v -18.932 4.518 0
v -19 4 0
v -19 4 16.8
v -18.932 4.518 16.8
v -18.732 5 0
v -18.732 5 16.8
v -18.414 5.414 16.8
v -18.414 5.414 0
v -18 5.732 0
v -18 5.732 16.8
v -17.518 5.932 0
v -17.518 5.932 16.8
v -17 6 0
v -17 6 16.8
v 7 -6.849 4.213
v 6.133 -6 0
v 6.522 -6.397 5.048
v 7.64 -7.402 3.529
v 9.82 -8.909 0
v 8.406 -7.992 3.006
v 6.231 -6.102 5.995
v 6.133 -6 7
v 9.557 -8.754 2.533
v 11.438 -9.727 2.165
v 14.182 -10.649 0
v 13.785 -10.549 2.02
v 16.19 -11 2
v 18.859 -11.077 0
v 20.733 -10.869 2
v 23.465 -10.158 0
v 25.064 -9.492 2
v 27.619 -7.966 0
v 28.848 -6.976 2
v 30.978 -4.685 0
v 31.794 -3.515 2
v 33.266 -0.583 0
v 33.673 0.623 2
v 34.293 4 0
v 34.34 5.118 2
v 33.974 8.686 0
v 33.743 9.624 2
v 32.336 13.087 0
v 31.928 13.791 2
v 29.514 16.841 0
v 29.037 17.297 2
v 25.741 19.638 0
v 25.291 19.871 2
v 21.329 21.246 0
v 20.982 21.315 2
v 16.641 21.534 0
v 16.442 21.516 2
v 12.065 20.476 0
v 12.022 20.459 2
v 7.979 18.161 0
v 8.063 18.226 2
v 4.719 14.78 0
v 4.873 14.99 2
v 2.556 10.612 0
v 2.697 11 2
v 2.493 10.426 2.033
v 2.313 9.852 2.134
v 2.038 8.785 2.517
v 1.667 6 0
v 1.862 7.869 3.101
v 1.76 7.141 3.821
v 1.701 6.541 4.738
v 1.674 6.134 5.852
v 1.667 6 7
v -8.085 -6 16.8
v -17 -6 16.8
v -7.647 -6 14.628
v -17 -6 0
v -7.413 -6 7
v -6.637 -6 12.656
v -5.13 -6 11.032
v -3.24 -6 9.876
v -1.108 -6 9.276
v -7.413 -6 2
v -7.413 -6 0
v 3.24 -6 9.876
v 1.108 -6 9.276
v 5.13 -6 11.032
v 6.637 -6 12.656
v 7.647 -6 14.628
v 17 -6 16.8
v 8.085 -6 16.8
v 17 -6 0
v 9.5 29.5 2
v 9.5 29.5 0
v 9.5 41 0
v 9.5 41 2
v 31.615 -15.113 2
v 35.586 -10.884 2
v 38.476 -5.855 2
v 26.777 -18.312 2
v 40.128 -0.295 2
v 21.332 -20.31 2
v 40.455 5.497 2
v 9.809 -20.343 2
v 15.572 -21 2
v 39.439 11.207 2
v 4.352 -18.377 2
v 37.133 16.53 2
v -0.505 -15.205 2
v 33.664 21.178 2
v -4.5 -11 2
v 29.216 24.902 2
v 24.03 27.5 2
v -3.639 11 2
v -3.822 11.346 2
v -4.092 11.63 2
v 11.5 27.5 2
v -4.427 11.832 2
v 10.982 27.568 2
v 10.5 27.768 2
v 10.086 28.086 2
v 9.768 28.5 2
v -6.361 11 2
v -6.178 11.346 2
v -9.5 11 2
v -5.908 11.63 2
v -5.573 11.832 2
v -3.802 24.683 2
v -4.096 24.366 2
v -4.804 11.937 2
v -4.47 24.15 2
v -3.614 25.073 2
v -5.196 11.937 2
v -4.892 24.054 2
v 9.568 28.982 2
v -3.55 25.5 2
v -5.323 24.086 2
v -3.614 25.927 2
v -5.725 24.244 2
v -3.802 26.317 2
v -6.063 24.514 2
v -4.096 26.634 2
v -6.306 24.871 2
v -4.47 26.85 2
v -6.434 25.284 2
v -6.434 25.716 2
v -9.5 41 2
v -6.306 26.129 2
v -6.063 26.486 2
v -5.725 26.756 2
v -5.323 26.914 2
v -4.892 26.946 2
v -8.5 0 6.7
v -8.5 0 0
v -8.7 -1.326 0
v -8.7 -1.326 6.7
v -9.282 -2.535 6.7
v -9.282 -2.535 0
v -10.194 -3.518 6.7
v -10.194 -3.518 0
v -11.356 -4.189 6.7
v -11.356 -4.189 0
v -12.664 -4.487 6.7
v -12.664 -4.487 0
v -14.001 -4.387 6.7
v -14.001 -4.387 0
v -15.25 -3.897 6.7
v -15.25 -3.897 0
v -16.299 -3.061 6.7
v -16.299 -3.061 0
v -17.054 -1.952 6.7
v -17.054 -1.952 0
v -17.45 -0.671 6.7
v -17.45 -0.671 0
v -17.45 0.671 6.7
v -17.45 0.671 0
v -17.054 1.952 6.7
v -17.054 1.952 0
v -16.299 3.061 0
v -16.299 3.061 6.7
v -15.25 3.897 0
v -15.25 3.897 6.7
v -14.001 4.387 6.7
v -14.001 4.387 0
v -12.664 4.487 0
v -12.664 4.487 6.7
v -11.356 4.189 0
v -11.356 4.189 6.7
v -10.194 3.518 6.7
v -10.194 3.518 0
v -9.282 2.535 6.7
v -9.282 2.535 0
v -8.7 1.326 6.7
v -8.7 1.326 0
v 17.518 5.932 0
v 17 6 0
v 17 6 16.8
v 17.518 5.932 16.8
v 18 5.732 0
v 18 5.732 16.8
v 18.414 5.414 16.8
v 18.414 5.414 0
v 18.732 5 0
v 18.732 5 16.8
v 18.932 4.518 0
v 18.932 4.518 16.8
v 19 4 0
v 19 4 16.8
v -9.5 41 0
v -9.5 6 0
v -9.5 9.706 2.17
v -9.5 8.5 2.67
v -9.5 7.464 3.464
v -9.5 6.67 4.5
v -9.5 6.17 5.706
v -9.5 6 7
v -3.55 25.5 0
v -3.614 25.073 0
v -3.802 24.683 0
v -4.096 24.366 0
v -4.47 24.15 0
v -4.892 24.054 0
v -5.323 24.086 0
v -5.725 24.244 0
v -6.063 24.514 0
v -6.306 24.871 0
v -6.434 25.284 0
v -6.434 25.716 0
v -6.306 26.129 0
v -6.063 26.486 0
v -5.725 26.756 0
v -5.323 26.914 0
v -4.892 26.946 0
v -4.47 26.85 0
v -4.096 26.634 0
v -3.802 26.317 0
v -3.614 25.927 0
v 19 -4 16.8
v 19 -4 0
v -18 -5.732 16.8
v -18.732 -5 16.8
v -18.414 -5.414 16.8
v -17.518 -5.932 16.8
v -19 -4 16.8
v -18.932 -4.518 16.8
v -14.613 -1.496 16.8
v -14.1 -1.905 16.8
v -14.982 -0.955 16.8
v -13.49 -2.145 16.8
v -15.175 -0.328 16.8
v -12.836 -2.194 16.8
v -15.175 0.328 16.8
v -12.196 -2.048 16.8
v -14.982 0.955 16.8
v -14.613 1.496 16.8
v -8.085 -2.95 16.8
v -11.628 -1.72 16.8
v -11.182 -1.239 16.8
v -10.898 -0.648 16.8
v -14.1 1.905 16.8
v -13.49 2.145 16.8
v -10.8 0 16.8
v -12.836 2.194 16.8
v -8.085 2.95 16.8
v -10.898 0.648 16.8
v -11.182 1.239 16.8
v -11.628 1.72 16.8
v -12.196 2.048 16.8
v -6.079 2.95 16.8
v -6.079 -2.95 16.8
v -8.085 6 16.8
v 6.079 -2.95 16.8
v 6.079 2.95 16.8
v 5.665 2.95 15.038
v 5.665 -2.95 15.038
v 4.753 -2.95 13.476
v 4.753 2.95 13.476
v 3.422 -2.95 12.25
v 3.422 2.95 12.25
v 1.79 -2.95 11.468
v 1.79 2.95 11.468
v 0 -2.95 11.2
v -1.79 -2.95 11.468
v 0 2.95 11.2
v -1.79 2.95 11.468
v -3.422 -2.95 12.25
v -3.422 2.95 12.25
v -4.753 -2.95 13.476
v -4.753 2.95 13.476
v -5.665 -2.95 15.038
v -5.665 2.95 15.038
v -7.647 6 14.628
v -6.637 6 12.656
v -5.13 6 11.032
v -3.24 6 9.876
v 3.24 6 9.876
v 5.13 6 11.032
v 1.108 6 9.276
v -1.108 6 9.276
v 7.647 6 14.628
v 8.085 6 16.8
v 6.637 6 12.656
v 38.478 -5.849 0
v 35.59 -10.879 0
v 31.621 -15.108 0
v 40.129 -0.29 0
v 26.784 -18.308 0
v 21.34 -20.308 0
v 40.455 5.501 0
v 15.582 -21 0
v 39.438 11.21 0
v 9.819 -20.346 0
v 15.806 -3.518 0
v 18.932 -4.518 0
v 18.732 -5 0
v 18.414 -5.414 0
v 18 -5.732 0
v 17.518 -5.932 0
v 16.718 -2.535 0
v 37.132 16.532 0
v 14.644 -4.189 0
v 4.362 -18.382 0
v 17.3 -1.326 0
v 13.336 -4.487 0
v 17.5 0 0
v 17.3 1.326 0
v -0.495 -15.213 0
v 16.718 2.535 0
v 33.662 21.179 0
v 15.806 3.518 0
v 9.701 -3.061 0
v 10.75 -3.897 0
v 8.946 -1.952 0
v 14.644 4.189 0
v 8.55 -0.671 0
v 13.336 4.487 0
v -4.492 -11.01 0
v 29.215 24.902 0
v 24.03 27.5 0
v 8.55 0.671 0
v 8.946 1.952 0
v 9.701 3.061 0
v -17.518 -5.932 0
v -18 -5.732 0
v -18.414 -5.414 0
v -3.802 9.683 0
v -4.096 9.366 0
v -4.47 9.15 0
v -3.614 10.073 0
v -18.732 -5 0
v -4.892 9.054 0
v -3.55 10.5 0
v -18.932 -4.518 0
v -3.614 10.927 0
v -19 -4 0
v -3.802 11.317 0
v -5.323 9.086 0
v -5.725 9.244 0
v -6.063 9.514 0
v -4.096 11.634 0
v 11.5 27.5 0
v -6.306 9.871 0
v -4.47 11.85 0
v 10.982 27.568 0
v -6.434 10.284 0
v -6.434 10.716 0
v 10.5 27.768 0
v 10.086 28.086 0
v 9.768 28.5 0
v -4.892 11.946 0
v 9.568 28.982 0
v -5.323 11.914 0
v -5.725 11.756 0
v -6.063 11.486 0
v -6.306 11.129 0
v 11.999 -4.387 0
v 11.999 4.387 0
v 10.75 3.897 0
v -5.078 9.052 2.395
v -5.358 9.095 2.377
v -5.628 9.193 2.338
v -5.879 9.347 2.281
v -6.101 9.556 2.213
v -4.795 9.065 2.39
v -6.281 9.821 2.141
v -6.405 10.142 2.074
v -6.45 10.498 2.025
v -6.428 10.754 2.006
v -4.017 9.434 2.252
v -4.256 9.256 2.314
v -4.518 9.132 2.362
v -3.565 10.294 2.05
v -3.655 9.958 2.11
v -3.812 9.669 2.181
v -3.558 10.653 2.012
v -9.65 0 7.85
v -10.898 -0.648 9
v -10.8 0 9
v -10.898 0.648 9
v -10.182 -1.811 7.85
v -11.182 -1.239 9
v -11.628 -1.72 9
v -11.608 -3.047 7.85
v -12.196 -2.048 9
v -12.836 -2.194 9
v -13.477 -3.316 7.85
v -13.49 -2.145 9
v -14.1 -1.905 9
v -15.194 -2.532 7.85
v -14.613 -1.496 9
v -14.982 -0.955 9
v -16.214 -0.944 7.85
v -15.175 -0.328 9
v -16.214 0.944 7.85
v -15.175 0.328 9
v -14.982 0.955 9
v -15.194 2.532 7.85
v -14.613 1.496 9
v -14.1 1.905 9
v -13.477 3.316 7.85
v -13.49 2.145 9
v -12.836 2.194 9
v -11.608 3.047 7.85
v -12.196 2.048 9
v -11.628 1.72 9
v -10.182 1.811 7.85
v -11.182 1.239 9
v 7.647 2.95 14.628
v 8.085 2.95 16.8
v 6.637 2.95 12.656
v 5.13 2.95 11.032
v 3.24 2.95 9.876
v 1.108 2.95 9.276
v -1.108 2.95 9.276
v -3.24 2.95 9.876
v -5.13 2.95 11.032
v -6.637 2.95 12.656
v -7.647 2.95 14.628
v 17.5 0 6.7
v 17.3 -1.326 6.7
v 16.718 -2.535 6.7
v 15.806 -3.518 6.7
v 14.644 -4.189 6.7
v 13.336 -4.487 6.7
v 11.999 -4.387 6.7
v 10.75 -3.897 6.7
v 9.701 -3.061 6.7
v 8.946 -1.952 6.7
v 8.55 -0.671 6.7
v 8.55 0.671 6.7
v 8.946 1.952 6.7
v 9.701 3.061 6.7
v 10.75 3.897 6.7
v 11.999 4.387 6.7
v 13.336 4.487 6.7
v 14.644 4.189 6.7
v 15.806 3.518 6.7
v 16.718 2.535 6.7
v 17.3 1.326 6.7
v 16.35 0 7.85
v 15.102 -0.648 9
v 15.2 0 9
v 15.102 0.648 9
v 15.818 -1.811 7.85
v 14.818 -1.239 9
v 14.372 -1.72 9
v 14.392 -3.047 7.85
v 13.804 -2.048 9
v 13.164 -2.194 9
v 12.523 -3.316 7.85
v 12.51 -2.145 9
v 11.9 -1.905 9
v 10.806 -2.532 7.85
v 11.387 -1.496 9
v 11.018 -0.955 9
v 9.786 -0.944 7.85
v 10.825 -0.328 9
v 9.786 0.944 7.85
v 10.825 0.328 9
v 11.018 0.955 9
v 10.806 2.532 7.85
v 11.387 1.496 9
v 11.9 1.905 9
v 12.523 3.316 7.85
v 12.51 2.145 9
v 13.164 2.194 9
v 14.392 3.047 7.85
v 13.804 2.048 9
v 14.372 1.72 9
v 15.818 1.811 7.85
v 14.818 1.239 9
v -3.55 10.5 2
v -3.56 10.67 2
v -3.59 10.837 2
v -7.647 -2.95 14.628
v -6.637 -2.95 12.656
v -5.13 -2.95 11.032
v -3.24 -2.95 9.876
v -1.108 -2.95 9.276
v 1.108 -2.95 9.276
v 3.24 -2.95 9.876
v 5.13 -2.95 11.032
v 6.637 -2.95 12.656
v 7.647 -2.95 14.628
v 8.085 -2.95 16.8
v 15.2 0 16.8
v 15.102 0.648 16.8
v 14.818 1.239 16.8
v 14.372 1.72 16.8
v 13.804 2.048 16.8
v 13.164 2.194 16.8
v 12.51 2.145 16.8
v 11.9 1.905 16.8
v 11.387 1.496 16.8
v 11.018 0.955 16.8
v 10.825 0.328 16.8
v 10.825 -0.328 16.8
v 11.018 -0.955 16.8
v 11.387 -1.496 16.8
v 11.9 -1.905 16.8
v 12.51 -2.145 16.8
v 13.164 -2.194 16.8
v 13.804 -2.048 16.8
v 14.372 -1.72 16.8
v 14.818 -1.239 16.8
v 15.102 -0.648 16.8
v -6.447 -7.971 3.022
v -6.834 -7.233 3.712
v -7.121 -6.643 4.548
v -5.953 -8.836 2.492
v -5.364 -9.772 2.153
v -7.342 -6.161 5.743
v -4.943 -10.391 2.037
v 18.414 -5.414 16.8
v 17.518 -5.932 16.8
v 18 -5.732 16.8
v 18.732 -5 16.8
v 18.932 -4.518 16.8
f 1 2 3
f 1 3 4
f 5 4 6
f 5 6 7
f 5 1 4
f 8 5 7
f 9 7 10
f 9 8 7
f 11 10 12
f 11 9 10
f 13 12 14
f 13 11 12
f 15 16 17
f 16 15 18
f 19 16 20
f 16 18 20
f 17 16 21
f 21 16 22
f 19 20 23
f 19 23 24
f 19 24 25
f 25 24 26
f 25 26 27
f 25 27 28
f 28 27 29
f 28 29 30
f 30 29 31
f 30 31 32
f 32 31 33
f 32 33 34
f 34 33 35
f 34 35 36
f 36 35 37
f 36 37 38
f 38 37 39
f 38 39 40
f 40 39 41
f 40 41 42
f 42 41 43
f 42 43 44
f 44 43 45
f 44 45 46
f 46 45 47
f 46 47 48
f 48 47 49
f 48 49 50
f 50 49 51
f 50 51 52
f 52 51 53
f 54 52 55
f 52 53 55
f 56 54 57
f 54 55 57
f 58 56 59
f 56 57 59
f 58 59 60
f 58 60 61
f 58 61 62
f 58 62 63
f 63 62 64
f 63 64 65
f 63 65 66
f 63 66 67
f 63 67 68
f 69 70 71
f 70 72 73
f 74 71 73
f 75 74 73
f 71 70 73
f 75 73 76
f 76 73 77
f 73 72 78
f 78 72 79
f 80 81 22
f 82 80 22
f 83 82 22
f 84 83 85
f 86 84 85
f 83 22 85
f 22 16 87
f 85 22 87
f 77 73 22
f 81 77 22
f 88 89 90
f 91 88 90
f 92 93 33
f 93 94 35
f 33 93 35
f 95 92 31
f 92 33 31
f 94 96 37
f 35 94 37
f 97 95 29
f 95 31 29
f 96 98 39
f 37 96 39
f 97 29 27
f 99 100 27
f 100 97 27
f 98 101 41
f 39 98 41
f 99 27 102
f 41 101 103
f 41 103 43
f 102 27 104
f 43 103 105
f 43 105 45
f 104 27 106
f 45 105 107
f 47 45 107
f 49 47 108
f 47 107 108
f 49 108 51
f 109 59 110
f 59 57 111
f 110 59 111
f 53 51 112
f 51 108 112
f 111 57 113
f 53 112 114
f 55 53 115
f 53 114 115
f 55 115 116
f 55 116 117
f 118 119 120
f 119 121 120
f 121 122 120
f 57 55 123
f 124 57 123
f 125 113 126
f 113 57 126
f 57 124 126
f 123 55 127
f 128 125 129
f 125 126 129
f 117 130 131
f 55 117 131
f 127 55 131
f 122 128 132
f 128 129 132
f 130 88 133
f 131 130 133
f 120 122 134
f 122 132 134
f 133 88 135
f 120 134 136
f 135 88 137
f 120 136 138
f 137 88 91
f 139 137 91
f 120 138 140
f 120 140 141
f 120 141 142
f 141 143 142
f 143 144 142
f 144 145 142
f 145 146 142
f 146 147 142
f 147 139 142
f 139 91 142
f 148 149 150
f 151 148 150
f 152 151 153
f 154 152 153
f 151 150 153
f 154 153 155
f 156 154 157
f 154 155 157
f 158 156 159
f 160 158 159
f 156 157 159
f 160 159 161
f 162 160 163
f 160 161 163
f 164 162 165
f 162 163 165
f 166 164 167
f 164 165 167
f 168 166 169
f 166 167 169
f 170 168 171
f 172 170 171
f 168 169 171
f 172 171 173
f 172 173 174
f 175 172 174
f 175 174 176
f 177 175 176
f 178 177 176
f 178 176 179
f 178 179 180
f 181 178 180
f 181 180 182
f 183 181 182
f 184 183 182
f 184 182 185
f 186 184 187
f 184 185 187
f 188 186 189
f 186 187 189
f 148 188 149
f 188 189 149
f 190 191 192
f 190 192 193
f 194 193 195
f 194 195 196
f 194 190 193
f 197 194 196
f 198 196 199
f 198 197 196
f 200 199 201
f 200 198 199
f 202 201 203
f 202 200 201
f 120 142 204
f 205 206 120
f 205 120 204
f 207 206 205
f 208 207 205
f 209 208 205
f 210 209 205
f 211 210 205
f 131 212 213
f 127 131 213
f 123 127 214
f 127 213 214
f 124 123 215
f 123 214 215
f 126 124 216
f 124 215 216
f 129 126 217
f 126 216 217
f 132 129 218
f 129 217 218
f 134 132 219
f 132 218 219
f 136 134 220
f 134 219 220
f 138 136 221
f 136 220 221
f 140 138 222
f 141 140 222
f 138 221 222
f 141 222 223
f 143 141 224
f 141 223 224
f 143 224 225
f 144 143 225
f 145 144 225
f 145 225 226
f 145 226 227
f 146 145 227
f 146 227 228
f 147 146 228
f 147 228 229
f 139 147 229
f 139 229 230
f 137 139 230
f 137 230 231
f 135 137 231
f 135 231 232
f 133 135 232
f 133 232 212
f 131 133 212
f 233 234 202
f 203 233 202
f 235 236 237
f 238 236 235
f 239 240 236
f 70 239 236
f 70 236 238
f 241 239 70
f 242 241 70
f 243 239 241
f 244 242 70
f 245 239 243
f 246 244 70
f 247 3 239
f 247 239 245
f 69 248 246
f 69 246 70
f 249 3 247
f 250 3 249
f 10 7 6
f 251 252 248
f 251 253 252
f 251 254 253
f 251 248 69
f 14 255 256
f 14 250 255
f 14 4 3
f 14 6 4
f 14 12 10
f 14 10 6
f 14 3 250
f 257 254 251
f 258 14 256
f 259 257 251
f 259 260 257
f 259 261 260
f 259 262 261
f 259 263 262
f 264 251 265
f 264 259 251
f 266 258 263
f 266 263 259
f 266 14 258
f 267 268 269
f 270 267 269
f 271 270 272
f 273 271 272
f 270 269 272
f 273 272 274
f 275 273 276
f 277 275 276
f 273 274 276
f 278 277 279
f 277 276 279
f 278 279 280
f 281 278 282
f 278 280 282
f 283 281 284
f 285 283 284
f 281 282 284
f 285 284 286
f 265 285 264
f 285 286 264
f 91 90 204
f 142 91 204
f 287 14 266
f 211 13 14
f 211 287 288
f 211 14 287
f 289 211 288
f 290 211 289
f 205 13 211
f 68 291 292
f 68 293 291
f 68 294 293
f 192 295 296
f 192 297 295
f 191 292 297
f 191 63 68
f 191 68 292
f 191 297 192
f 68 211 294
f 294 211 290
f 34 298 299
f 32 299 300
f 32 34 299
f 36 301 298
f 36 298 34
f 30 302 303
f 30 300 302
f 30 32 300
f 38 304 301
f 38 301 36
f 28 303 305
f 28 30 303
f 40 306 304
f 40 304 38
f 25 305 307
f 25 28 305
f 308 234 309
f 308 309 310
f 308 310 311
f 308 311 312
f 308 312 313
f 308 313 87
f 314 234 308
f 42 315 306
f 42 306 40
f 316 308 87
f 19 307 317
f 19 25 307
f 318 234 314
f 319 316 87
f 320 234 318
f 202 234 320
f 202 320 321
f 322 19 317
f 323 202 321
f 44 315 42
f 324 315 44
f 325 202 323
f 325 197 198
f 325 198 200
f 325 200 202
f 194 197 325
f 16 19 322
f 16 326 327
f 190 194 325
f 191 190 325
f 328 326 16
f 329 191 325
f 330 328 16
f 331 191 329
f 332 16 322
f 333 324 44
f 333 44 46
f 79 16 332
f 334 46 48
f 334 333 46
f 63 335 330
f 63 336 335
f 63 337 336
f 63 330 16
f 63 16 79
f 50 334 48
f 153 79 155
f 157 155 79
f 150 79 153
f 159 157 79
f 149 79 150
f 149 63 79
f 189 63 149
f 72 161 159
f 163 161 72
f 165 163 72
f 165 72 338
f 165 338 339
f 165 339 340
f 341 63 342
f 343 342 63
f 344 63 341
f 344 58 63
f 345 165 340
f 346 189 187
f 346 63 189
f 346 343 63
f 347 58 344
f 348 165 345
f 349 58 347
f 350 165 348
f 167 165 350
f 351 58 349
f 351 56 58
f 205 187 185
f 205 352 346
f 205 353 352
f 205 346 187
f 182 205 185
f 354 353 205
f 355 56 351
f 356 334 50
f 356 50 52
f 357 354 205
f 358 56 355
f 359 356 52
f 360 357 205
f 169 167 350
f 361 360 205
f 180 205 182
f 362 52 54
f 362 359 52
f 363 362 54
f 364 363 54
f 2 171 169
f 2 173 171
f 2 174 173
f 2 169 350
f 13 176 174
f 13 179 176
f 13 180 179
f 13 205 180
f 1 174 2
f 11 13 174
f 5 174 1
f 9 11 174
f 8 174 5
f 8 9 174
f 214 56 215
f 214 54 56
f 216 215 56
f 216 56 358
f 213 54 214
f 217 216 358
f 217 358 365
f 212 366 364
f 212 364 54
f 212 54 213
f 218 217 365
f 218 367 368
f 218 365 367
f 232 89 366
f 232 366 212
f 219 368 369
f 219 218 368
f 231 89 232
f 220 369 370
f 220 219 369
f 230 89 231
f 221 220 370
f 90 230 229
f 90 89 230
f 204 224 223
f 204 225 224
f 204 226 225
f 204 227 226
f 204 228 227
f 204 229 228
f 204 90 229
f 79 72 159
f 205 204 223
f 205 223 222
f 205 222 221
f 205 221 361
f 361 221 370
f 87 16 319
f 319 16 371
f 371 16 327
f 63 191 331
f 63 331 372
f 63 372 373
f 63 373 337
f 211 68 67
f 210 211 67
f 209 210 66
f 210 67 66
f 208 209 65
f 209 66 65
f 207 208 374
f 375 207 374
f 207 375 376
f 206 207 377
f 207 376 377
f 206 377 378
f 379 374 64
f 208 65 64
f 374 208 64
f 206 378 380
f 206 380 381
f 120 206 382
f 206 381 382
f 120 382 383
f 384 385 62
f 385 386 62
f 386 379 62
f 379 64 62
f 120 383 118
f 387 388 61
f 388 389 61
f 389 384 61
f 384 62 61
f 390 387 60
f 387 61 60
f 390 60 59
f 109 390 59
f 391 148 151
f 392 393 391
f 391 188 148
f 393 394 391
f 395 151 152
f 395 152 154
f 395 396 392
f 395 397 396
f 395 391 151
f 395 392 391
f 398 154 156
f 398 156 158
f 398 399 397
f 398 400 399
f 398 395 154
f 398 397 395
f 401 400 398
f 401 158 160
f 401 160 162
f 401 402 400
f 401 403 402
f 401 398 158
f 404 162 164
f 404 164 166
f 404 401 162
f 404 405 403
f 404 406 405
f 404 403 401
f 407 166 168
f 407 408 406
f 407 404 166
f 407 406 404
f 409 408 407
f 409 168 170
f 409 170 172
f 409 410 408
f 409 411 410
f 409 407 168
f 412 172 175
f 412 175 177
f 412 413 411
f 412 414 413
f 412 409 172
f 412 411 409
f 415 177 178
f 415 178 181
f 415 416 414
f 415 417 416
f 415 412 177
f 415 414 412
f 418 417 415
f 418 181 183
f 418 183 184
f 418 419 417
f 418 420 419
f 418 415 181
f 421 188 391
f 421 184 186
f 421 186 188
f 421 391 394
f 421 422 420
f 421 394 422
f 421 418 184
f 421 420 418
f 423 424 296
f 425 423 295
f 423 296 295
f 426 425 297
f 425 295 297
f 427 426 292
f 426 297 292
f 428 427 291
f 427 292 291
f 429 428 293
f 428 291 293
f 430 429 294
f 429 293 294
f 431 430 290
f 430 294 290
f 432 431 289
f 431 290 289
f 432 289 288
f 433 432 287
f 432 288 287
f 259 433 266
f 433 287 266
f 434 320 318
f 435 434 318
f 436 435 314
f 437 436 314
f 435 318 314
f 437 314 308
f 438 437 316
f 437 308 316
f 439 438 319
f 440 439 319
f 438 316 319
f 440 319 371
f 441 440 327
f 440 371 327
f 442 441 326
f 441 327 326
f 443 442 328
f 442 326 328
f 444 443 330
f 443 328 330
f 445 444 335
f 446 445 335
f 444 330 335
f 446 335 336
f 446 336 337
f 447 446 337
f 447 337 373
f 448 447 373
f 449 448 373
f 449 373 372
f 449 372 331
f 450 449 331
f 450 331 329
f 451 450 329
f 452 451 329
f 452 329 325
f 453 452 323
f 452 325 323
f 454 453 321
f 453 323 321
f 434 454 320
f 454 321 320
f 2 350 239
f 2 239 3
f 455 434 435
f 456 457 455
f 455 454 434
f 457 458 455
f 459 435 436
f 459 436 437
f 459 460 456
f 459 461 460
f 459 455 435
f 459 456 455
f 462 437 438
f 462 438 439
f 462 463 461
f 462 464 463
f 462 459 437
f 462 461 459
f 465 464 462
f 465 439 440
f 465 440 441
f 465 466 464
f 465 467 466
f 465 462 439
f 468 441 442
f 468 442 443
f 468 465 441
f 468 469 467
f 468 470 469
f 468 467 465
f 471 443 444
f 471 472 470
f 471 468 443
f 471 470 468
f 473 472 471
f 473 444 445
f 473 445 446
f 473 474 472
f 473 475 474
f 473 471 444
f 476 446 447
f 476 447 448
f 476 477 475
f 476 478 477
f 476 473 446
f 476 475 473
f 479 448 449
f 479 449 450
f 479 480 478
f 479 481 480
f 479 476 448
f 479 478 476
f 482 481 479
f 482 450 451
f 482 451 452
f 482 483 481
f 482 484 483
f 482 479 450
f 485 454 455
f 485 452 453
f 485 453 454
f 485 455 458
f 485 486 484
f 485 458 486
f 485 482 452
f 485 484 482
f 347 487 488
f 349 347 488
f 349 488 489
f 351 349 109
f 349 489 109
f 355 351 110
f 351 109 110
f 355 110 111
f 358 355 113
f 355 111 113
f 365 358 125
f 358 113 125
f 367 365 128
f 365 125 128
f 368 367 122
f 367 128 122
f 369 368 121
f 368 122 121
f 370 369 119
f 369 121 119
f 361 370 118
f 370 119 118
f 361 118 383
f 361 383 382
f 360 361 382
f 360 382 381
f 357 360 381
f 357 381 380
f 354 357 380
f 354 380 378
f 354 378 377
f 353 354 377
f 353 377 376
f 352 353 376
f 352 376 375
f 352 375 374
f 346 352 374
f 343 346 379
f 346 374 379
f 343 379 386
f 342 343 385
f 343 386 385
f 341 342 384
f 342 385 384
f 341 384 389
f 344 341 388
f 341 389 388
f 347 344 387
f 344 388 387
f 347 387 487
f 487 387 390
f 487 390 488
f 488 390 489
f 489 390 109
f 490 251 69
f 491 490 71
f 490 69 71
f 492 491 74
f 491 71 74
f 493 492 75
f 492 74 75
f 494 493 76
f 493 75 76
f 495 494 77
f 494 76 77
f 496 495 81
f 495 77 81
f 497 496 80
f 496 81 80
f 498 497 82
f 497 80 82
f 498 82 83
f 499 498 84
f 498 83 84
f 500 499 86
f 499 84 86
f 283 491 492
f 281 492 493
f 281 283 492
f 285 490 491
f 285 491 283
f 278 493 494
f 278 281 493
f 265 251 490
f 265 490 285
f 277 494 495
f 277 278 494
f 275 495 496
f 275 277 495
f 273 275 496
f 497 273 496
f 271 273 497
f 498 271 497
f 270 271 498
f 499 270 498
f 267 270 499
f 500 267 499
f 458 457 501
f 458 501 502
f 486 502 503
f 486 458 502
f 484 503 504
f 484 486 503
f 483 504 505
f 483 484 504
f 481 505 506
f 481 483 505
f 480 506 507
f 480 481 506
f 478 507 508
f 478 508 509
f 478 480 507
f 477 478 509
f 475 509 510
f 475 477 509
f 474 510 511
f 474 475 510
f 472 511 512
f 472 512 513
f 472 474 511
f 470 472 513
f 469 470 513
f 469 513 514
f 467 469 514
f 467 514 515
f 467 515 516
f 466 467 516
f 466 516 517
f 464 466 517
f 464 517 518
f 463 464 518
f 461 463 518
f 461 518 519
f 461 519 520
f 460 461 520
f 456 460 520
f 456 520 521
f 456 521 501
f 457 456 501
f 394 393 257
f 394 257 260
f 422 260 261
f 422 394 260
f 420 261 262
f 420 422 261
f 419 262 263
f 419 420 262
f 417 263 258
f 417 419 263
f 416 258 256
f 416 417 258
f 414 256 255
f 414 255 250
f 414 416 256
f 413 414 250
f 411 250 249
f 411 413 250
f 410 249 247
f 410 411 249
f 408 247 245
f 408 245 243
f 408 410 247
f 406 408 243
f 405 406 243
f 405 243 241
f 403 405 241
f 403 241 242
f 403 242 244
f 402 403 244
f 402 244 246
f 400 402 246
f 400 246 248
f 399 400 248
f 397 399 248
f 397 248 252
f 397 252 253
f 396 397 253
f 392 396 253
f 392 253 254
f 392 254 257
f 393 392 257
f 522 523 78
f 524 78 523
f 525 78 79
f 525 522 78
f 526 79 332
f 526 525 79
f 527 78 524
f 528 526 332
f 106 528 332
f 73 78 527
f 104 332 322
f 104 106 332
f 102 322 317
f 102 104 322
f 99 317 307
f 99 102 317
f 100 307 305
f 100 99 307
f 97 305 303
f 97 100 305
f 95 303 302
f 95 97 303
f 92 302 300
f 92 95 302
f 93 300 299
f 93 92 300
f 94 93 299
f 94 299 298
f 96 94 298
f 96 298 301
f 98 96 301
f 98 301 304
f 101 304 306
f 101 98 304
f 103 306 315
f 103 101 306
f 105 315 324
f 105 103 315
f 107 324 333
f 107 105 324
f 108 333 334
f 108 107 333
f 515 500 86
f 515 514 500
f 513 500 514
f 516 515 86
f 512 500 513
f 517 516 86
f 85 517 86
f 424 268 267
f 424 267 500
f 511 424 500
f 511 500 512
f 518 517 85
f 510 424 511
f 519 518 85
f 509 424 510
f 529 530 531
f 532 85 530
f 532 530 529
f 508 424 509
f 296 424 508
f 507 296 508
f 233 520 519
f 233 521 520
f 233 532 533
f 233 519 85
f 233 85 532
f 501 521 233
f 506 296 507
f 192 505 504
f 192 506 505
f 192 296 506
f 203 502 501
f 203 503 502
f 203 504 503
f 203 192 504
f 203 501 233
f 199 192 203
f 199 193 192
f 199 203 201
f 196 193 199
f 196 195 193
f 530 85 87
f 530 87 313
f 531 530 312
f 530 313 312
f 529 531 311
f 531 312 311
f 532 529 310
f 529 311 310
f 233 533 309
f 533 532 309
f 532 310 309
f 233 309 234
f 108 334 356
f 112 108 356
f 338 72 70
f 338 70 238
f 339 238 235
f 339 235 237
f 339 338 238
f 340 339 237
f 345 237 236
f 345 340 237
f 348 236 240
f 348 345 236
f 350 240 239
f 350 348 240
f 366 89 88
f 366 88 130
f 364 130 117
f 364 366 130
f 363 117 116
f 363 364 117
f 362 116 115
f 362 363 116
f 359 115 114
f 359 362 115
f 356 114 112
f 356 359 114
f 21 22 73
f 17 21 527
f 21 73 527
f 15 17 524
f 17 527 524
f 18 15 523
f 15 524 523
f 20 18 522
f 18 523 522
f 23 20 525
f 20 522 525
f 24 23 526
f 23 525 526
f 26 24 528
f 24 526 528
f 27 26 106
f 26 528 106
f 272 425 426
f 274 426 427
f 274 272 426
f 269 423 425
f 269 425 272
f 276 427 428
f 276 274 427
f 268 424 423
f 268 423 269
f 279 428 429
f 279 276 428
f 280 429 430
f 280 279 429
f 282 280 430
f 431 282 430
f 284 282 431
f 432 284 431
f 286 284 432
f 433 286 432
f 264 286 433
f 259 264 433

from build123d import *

# Parameters (mm, degrees)
F0_W          = 38
F0_H          = 12
F0_R          = 2.2
F1_DEPTH      = 16.8
F3_DEPTH      = 12.001
F4_R          = 8.1
F5_DEPTH      = 3.05
F6_R          = 8.1
F7_DEPTH      = 3.05
F8_R          = 16.345
F9_DEPTH      = 2
F10_R         = 1.45
F11_DEPTH     = 16.801
F12_R         = 4.5
F12_R_2       = 2.2
F13_DEPTH     = 9
F14_SIZE      = 2.29999
F15_T4_DEPTH  = 23.6674466009
F15_S5_R      = 16.345
F15_T6_DEPTH  = 14
F15_S7_R      = 1.45
F15_T8_DEPTH  = 14
F15_T12_DEPTH = 38.54569481
F15_S13_R     = 25
F15_T14_DEPTH = 21
F15_S15_R     = 16.345
F15_T16_DEPTH = 21
F16_T1_DEPTH  = 2
F16_T3_DEPTH  = 26.8


# Not quite as in the source:
# - a fillet or chamfer that OpenCascade refuses, or shapes differently, is made with other operations: its cross-section is extruded or revolved along the edge and cut away or added
# - a fillet or chamfer is up to 0.001 mm smaller than in the source, because OpenCascade refuses the exact size


with BuildPart() as f1:
    # F0 (on Top) → F1 (new body)
    with BuildSketch(Plane.XY):
        Rectangle(F0_W, F0_H)
        with Locations((-13, 0)):
            Circle(F0_R, mode=Mode.SUBTRACT)
        with Locations((13, 0)):
            Circle(F0_R, mode=Mode.SUBTRACT)
    extrude(amount=F1_DEPTH)

    # F2 (on face) → F3 (cut, through all)
    with BuildSketch(Plane(origin=(0, 6, 0), x_dir=(-1, 0, 0), z_dir=(0, 1, 0))):
        with BuildLine():
            ThreePointArc((-6.0794736614, 16.8), (0, 11.2), (6.0794736614, 16.8))
            Line((6.0794736614, 16.8), (-6.0794736614, 16.8))
        make_face()
        with BuildLine():
            Line((-6.0794736614, 16.8), (6.0794736614, 16.8))
            ThreePointArc((6.0794736614, 16.8), (6.0948662551, 17.0497894234), (6.1, 17.3))
            ThreePointArc((6.1, 17.3), (-0.2502105766, 23.3948662551), (-6.0794736614, 16.8))
        make_face()
    extrude(amount=-F3_DEPTH, mode=Mode.SUBTRACT)

    # F4 (on face) → F5 (cut)
    with BuildSketch(Plane(origin=(0, 6, 0), x_dir=(-1, 0, 0), z_dir=(0, 1, 0))):
        with Locations((0, 17.3)):
            Circle(F4_R)
    extrude(amount=-F5_DEPTH, mode=Mode.SUBTRACT)

    # F6 (on face) → F7 (cut)
    with BuildSketch(Plane.XZ.offset(6)):
        with Locations((0, 17.3)):
            Circle(F6_R)
    extrude(amount=-F7_DEPTH, mode=Mode.SUBTRACT)

    # F8 (on Top) → F9 (join)
    with BuildSketch(Plane.XY):
        with BuildLine():
            Line((-9.5, 41), (-9.5, 4))
            ThreePointArc((-9.5, 4), (29.848439809, -16.4722441189), (24.03, 27.5))
            Line((24.03, 27.5), (9.5, 27.5))
            Line((9.5, 27.5), (9.5, 41))
            Line((9.5, 41), (-9.5, 41))
        make_face()
        with Locations((17.995, 5.245)):
            Circle(F8_R, mode=Mode.SUBTRACT)
    extrude(amount=F9_DEPTH)

    # F10 (on face) → F11 (cut, through all)
    with BuildSketch(Plane(origin=(0, 0, 0), x_dir=(1, 0, 0), z_dir=(0, 0, -1))):
        with Locations((-5, -10.5)):
            Circle(F10_R)
        with Locations((-5, -25.5)):
            Circle(F10_R)
    extrude(amount=-F11_DEPTH, mode=Mode.SUBTRACT)

    # F12 (on face) → F13 (cut)
    with BuildSketch(Plane(origin=(0, 0, 0), x_dir=(1, 0, 0), z_dir=(0, 0, -1))):
        with Locations((-13, 0)):
            Circle(F12_R)
        with Locations((-13, 0)):
            Circle(F12_R_2, mode=Mode.SUBTRACT)
        with Locations((13, 0)):
            Circle(F12_R)
        with Locations((13, 0)):
            Circle(F12_R_2, mode=Mode.SUBTRACT)
    extrude(amount=-F13_DEPTH, mode=Mode.SUBTRACT)

    # F14 (size 2.3 in the source; OpenCascade refuses exactly that, so slightly less here)
    f14_edges = [f1.edges().sort_by_distance(p)[0] for p in [
        (-17.5, 0, 9),
        (8.5, 0, 9),
    ]]
    chamfer(f14_edges, length=F14_SIZE)

    # F15: fillet of radius 5 on 2 edges, made by hand


with BuildPart() as f15_tool2:
    # F15_s3 → F15_t4 (new body)
    with BuildSketch(Plane.YZ.offset(14.1674466009)):
        with BuildLine():
            ThreePointArc((6, 7), (7.4644660941, 3.4644660941), (11, 2))
            Line((11, 2), (6, 2))
            Line((6, 2), (6, 7))
        make_face()
    extrude(amount=-F15_T4_DEPTH)

    # F15_s5 → F15_t6 (cut, symmetric)
    with BuildSketch(Plane.XY.offset(4.5)):
        with Locations((17.995, 5.245)):
            Circle(F15_S5_R)
    extrude(amount=F15_T6_DEPTH, both=True, mode=Mode.SUBTRACT)

    # F15_s7 → F15_t8 (cut, symmetric)
    with BuildSketch(Plane.XY.offset(4.5)):
        with Locations((-5, 10.5)):
            Circle(F15_S7_R)
    extrude(amount=F15_T8_DEPTH, both=True, mode=Mode.SUBTRACT)


with BuildPart() as f1_1:
    add(f1.part)

    # F15_t1: union F15_tool2
    add(f15_tool2.part)


with BuildPart() as f15_tool10:
    # F15_s11 → F15_t12 (new body)
    with BuildSketch(Plane.YZ.offset(-19.9127772578)):
        with BuildLine():
            ThreePointArc((-6, 7), (-7.4644660941, 3.4644660941), (-11, 2))
            Line((-11, 2), (-6, 2))
            Line((-6, 2), (-6, 7))
        make_face()
    extrude(amount=F15_T12_DEPTH)

    # F15_s13 → F15_t14 (intersect, symmetric)
    with BuildSketch(Plane.XY.offset(4.5)):
        with Locations((15.4999999989, 4.0002319164)):
            Circle(F15_S13_R)
    extrude(amount=F15_T14_DEPTH, both=True, mode=Mode.INTERSECT)

    # F15_s15 → F15_t16 (cut, symmetric)
    with BuildSketch(Plane.XY.offset(4.5)):
        with Locations((17.995, 5.245)):
            Circle(F15_S15_R)
    extrude(amount=F15_T16_DEPTH, both=True, mode=Mode.SUBTRACT)


with BuildPart() as f1_2:
    add(f1_1.part)

    # F15_t9: union F15_tool10
    add(f15_tool10.part)

    # F16: fillet of radius 2 on 5 edges, made by hand

    # F16_s2 → F16_t1 (join)
    with BuildSketch(Plane.XY):
        with BuildLine():
            ThreePointArc((9.5, 29.5), (10.0857864376, 28.0857864376), (11.5, 27.5))
            Line((11.5, 27.5), (9.5, 27.5))
            Line((9.5, 27.5), (9.5, 29.5))
        make_face()
    extrude(amount=F16_T1_DEPTH)

    # F16_s4 → F16_t3 (cut)
    with BuildSketch(Plane.XY.offset(-5)):
        with BuildLine():
            ThreePointArc((17, 6), (18.4142135624, 5.4142135624), (19, 4))
            Line((19, 4), (19, 6))
            Line((19, 6), (17, 6))
        make_face()
        with BuildLine():
            ThreePointArc((17, -6), (18.4142135624, -5.4142135624), (19, -4))
            Line((19, -4), (19, -6))
            Line((19, -6), (17, -6))
        make_face()
        with BuildLine():
            ThreePointArc((-19, 4), (-18.4142135624, 5.4142135624), (-17, 6))
            Line((-17, 6), (-19, 6))
            Line((-19, 6), (-19, 4))
        make_face()
        with BuildLine():
            ThreePointArc((-17, -6), (-18.4142135624, -5.4142135624), (-19, -4))
            Line((-19, -4), (-19, -6))
            Line((-19, -6), (-17, -6))
        make_face()
    extrude(amount=F16_T3_DEPTH, mode=Mode.SUBTRACT)


solid = f1_2.part
